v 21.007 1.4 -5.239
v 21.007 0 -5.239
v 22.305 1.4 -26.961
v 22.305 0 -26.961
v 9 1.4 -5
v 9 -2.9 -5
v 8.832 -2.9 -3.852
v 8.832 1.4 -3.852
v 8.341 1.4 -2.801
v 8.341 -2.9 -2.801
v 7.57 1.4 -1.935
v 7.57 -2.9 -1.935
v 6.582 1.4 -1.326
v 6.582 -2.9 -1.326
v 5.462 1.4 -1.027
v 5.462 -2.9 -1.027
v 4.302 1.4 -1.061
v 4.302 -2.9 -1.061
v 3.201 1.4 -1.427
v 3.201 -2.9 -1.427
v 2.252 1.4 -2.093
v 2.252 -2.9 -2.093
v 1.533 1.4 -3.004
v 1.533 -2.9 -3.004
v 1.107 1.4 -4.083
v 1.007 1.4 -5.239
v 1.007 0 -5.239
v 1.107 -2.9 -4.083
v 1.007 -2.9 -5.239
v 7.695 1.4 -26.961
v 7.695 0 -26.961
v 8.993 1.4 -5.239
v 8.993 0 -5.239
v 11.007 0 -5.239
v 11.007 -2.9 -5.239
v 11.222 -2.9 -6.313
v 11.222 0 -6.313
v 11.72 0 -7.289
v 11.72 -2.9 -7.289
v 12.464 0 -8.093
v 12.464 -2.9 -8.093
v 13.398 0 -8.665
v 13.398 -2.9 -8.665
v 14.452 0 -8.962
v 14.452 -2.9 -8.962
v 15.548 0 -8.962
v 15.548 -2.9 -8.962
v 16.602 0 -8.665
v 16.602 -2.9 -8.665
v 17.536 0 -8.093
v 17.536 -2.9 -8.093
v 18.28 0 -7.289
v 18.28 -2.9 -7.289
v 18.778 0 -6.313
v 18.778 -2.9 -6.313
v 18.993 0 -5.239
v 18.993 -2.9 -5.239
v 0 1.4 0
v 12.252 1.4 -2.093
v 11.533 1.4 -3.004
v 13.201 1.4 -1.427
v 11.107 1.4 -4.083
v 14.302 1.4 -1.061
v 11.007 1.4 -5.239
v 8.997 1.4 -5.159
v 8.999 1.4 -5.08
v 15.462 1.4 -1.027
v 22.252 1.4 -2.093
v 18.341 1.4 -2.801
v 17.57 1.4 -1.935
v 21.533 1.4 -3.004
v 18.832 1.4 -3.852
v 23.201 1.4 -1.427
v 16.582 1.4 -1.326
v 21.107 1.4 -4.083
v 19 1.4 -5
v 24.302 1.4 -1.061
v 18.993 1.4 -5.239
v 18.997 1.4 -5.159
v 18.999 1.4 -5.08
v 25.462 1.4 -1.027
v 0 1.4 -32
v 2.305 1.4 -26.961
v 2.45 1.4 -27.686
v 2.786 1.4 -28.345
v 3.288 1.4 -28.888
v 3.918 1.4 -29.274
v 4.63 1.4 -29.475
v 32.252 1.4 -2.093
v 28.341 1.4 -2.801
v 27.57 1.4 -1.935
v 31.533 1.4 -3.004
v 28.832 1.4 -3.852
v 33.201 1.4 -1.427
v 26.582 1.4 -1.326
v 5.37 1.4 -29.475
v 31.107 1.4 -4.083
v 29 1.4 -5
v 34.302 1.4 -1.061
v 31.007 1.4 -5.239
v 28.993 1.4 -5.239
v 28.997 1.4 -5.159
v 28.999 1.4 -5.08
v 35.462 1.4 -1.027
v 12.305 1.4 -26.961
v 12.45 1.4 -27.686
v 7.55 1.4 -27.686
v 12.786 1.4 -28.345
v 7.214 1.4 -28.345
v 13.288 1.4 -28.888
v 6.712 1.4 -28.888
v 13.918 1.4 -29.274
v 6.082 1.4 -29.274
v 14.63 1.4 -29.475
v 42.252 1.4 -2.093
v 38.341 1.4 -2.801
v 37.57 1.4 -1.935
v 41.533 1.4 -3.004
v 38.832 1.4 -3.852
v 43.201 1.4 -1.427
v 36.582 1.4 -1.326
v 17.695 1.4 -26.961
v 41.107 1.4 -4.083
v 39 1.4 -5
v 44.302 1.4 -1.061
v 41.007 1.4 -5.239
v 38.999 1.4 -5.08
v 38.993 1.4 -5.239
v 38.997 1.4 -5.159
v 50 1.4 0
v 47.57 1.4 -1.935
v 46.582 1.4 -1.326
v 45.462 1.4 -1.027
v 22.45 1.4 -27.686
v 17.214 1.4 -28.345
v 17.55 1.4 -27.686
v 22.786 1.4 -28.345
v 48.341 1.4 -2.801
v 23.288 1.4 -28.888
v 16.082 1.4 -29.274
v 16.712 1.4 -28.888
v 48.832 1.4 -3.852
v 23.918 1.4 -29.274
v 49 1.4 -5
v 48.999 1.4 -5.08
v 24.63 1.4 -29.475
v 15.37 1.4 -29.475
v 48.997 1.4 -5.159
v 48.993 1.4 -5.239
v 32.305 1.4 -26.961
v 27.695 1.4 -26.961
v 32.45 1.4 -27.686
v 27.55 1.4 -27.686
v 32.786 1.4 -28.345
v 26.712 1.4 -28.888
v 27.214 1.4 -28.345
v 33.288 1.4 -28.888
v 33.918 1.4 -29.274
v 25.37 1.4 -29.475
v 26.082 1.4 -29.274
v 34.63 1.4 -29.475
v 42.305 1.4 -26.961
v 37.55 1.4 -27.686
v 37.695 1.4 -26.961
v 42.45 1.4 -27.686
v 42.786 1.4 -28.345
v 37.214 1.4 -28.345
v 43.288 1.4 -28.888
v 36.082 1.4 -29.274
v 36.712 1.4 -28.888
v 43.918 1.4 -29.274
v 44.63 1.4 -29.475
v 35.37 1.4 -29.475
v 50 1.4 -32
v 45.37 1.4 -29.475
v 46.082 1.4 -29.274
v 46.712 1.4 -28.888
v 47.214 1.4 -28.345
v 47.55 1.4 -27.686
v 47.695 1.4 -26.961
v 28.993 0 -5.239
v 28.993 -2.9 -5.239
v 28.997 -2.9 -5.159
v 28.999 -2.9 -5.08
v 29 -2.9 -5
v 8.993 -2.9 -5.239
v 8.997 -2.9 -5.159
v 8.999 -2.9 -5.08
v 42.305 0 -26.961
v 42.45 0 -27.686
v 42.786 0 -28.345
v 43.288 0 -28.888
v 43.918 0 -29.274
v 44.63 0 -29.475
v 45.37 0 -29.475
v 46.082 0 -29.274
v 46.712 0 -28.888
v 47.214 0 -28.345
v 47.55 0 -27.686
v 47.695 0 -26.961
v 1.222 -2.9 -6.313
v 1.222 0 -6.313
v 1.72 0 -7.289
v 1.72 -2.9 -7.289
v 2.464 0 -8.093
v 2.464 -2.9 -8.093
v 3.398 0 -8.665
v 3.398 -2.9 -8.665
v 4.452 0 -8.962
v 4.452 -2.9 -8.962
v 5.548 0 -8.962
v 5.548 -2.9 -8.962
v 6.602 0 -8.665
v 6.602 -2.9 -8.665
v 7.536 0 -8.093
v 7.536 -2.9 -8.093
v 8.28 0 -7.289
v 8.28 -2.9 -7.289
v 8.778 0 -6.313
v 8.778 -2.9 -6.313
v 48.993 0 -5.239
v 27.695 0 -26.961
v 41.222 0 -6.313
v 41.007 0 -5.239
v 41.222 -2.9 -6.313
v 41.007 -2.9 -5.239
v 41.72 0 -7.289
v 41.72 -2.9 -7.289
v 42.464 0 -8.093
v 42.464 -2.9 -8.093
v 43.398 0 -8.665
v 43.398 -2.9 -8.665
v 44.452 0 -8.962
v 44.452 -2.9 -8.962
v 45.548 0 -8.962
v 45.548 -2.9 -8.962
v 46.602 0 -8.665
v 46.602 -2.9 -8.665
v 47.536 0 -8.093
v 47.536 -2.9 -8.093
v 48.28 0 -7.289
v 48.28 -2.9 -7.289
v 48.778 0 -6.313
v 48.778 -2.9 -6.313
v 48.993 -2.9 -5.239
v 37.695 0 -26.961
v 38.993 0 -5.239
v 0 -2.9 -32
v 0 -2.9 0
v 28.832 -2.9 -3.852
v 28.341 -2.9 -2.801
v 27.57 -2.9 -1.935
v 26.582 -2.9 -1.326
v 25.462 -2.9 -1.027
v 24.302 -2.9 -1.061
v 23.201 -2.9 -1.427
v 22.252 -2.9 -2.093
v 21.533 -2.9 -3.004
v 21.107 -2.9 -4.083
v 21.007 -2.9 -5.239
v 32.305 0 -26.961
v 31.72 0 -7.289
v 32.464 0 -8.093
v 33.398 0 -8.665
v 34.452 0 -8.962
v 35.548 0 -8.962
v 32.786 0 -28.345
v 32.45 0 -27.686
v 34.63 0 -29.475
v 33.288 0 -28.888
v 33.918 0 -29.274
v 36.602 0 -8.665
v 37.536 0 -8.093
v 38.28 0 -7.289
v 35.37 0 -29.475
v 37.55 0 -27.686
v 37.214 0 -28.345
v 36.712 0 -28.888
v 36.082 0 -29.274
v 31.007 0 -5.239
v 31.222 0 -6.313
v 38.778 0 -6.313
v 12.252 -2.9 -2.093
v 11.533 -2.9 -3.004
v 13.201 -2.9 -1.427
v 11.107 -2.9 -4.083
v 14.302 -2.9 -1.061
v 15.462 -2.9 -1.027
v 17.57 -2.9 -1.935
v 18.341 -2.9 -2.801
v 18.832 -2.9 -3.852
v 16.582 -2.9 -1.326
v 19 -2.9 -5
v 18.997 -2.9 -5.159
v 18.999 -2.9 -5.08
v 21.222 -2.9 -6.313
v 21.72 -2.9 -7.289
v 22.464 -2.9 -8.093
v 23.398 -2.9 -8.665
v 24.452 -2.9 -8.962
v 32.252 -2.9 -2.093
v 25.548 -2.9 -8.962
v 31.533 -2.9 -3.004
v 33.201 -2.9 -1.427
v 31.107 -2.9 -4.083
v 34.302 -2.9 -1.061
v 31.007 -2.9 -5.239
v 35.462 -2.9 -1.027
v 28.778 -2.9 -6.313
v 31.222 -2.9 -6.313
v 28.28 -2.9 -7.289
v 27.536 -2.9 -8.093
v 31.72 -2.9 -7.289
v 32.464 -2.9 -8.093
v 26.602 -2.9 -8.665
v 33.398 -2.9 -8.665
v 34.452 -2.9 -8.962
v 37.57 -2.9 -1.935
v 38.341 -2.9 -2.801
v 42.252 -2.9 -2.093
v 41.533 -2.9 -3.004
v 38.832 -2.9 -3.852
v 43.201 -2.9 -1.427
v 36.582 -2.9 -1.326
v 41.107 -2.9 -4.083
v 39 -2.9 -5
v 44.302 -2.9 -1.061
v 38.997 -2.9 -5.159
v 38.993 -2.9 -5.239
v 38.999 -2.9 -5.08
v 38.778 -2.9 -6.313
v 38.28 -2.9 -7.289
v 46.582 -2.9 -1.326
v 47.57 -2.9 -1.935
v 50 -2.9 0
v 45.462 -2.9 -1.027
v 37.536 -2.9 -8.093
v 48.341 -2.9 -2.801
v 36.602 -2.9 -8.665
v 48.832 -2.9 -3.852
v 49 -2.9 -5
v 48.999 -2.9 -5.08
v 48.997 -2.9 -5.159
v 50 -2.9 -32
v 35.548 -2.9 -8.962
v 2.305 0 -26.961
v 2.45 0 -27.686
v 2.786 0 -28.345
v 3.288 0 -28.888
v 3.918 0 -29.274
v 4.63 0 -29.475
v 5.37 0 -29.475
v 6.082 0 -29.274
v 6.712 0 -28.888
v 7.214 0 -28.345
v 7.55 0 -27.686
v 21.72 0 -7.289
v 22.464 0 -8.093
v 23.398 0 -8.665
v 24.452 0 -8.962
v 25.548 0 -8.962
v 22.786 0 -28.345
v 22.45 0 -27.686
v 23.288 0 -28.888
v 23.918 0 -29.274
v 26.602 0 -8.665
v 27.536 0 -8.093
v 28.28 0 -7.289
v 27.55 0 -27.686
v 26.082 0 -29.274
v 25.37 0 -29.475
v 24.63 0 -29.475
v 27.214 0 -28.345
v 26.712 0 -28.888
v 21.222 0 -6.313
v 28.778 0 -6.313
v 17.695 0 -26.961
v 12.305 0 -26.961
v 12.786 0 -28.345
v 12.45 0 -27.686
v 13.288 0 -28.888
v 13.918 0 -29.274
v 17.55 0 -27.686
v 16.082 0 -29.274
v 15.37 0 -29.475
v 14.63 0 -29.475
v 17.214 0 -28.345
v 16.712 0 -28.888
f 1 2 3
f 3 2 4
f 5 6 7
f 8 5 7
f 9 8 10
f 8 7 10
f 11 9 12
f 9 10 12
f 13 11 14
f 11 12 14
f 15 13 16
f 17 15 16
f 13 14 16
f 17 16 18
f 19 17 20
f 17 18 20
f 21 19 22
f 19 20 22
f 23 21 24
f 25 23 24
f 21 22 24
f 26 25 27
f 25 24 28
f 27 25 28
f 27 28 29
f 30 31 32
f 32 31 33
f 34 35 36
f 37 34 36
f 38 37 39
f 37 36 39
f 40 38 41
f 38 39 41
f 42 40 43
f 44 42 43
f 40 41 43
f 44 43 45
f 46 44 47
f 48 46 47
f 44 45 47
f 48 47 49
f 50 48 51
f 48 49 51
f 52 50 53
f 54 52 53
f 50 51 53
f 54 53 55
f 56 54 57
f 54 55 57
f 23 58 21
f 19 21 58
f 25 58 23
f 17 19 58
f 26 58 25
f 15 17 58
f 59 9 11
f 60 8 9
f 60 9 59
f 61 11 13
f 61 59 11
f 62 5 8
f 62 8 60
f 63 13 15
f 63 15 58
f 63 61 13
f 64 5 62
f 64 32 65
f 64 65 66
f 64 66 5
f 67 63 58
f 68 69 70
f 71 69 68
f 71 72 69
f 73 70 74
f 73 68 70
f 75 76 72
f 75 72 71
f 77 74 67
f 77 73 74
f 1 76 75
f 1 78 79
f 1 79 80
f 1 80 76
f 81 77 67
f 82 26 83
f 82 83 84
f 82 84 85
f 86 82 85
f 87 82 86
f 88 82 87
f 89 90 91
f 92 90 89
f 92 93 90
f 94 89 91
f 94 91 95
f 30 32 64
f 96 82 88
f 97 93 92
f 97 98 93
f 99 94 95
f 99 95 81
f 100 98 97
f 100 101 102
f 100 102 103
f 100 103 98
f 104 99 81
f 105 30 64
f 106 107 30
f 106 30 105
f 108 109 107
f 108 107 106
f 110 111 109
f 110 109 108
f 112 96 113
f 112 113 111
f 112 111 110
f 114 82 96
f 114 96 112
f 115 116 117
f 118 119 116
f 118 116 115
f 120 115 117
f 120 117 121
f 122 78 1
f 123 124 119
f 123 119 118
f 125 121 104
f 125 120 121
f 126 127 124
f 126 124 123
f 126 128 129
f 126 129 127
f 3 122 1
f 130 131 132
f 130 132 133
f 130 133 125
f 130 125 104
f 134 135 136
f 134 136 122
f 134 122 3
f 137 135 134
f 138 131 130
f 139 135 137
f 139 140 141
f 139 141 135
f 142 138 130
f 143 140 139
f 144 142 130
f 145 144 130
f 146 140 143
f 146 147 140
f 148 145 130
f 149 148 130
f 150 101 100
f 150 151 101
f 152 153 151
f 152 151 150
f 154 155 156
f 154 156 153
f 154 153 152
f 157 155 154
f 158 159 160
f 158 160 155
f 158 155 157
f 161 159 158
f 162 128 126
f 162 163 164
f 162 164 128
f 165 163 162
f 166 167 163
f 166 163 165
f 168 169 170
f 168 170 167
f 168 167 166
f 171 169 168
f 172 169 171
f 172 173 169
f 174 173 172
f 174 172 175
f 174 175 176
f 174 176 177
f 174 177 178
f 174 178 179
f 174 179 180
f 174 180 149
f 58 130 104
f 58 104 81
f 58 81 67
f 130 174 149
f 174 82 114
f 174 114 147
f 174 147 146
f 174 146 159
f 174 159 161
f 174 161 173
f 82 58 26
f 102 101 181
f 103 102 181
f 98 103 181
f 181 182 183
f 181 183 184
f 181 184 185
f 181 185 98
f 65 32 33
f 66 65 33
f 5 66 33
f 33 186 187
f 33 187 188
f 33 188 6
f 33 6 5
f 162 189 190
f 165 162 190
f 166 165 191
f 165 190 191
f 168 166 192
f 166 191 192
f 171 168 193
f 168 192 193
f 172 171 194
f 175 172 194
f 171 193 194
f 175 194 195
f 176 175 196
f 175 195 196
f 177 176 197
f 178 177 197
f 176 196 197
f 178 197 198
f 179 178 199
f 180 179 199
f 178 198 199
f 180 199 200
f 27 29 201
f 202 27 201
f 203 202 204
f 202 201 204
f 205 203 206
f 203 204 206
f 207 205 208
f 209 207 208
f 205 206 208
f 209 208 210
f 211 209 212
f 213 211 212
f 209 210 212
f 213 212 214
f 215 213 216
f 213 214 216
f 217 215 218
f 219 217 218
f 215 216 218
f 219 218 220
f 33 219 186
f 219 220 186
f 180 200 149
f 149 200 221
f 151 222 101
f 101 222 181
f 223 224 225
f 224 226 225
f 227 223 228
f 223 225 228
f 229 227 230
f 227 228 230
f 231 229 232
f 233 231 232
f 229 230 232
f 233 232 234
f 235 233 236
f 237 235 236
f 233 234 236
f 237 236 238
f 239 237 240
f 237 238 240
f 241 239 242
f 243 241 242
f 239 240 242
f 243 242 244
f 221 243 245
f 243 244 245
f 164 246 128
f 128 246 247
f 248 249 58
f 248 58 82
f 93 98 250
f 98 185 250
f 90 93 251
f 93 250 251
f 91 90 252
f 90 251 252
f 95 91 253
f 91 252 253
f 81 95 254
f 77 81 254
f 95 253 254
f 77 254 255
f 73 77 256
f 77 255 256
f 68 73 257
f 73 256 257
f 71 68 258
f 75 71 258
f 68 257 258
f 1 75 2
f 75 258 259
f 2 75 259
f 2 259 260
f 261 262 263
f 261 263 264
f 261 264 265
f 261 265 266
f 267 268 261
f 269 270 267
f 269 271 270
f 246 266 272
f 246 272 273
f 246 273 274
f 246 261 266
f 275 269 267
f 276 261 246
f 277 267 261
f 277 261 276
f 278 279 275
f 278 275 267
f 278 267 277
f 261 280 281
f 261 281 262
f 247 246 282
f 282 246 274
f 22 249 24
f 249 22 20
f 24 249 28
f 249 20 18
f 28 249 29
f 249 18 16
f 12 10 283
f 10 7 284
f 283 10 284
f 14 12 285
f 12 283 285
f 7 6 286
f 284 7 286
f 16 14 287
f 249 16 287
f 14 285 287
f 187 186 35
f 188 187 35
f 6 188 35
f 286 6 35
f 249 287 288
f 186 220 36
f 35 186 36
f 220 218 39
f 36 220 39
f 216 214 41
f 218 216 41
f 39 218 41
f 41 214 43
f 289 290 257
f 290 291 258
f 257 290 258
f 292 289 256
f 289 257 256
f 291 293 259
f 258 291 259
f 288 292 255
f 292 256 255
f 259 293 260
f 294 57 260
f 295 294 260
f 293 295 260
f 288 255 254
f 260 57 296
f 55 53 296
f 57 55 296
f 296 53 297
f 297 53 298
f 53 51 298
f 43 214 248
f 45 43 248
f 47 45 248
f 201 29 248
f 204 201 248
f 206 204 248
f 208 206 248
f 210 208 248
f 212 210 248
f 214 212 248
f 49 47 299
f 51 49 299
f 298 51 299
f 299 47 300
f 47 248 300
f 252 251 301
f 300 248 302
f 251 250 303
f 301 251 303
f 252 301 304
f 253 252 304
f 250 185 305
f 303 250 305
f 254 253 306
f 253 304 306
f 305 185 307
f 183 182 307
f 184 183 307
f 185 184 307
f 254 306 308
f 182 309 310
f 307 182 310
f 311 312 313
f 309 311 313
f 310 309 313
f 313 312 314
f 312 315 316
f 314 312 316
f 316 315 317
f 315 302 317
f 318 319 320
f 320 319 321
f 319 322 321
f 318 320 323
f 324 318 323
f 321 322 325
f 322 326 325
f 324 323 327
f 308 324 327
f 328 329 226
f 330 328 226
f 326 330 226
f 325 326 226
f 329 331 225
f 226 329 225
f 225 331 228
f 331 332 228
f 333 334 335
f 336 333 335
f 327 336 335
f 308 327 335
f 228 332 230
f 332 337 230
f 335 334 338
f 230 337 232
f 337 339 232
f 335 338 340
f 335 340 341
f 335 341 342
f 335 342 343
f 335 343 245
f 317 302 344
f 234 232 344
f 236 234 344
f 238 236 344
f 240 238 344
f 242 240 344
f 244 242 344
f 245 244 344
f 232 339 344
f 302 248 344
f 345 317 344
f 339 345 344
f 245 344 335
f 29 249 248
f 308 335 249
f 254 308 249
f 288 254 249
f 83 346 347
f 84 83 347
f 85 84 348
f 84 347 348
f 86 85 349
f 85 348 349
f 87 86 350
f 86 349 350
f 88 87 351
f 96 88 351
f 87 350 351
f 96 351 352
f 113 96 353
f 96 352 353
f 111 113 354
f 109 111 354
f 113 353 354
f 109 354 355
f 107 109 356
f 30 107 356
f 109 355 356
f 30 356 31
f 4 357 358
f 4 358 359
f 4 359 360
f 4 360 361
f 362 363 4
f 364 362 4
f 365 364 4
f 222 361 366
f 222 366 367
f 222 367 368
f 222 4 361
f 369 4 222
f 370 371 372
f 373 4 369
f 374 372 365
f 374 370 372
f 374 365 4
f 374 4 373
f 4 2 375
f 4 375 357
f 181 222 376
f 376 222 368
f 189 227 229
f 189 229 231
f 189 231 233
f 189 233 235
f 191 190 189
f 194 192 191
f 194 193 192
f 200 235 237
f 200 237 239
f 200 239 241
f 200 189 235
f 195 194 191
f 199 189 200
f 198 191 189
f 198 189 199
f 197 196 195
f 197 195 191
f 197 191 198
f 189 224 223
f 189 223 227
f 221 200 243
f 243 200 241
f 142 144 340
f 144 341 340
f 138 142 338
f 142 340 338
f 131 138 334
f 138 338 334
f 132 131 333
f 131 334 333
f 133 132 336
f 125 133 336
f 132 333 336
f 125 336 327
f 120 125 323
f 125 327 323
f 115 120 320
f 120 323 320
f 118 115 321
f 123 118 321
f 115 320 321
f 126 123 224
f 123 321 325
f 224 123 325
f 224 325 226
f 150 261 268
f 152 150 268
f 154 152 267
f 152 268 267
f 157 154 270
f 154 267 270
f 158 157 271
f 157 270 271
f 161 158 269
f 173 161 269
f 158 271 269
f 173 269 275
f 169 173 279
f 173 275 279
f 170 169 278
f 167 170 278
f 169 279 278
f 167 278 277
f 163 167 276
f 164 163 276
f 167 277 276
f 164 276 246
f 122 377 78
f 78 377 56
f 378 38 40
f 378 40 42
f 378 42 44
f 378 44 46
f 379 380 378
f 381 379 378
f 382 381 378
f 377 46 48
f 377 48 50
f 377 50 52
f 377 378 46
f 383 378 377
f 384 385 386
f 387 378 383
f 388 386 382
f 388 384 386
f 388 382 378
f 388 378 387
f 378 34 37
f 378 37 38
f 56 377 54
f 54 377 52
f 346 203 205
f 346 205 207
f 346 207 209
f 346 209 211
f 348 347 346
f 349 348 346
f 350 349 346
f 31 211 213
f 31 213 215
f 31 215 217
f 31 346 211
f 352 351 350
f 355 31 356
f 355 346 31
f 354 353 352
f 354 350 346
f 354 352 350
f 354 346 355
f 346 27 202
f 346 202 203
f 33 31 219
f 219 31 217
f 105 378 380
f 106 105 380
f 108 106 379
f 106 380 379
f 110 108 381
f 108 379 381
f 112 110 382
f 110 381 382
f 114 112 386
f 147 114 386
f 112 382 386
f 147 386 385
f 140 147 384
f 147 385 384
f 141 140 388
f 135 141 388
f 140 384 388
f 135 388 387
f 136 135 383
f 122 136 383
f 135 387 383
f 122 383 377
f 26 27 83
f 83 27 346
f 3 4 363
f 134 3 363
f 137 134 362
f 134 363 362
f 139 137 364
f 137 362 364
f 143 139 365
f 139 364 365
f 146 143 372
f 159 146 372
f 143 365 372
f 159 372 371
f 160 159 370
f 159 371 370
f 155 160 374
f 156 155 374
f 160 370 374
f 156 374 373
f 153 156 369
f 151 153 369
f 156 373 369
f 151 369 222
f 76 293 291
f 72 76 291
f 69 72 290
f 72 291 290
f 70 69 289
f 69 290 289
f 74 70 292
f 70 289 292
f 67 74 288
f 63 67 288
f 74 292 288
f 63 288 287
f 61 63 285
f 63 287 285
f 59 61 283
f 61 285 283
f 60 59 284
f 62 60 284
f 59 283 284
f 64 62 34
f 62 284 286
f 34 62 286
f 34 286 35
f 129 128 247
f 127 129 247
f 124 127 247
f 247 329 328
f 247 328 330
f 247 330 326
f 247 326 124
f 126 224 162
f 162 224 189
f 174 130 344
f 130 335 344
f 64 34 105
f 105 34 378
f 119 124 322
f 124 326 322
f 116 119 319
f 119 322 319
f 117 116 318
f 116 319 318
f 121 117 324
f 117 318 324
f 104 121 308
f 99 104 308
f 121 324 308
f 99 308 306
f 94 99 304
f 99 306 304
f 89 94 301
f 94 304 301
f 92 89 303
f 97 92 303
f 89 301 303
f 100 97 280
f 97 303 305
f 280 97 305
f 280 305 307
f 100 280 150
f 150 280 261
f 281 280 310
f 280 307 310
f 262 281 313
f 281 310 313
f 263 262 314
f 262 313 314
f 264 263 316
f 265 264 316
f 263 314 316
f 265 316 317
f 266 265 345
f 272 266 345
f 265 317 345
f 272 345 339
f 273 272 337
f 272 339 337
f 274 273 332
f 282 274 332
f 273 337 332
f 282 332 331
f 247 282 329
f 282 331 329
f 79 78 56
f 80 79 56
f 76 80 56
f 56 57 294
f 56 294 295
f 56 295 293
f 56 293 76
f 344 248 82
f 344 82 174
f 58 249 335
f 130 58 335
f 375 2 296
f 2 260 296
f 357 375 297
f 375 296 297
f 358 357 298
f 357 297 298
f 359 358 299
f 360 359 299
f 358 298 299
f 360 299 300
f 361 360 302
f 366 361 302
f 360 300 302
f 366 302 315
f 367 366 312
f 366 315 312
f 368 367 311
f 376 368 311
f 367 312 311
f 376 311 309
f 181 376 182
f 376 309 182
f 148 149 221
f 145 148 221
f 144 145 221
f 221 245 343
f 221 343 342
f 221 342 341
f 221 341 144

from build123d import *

# Parameters (mm, degrees)
SKETCH1_W           = 10
SKETCH1_H           = 32
BOSS_EXTRUDE1_DEPTH = 1.4
BOSS_EXTRUDE2_START = -2.9
SKETCH1_3_W         = 10
SKETCH1_3_H         = 32
SKETCH1_3_R         = 4
BOSS_EXTRUDE2_DEPTH = 2.9
LPATTERN1_COUNT     = 5
LPATTERN1_PITCH     = 10


with BuildPart() as part:
    # Sketch1 → Boss-Extrude1 (new body)
    with BuildSketch(Plane(origin=(0, 0, 0), x_dir=(1, 0, 0), z_dir=(0, 1, 0))):
        with Locations((5, 16)):
            Rectangle(SKETCH1_W, SKETCH1_H)
        with BuildLine():
            Line((1.00711853, 5.23853211), (2.304805008, 26.961009174))
            ThreePointArc((2.304805008, 26.961009174), (5, 29.5), (7.695194992, 26.961009174))
            Line((7.695194992, 26.961009174), (8.99288147, 5.23853211))
            ThreePointArc((8.99288147, 5.23853211), (8.998219971, 5.119319153), (9, 5))
            ThreePointArc((9, 5), (4.880680847, 1.001780029), (1.00711853, 5.23853211))
        make_face(mode=Mode.SUBTRACT)
    boss_extrude1 = extrude(amount=BOSS_EXTRUDE1_DEPTH)

    # Sketch1<3> → Boss-Extrude2 (add)
    with BuildSketch(Plane(origin=(0, 0, 0), x_dir=(1, 0, 0), z_dir=(0, 1, 0)).offset(BOSS_EXTRUDE2_START)):
        with Locations((5, 16)):
            Rectangle(SKETCH1_3_W, SKETCH1_3_H)
        with Locations((5, 5)):
            Circle(SKETCH1_3_R, mode=Mode.SUBTRACT)
    boss_extrude2 = extrude(amount=BOSS_EXTRUDE2_DEPTH)

    # LPattern1: Boss-Extrude1, Boss-Extrude2 ×5
    with Locations(*[(i * LPATTERN1_PITCH, 0, 0) for i in range(1, LPATTERN1_COUNT)]):
        add(boss_extrude1)
        add(boss_extrude2)


solid = part.part
